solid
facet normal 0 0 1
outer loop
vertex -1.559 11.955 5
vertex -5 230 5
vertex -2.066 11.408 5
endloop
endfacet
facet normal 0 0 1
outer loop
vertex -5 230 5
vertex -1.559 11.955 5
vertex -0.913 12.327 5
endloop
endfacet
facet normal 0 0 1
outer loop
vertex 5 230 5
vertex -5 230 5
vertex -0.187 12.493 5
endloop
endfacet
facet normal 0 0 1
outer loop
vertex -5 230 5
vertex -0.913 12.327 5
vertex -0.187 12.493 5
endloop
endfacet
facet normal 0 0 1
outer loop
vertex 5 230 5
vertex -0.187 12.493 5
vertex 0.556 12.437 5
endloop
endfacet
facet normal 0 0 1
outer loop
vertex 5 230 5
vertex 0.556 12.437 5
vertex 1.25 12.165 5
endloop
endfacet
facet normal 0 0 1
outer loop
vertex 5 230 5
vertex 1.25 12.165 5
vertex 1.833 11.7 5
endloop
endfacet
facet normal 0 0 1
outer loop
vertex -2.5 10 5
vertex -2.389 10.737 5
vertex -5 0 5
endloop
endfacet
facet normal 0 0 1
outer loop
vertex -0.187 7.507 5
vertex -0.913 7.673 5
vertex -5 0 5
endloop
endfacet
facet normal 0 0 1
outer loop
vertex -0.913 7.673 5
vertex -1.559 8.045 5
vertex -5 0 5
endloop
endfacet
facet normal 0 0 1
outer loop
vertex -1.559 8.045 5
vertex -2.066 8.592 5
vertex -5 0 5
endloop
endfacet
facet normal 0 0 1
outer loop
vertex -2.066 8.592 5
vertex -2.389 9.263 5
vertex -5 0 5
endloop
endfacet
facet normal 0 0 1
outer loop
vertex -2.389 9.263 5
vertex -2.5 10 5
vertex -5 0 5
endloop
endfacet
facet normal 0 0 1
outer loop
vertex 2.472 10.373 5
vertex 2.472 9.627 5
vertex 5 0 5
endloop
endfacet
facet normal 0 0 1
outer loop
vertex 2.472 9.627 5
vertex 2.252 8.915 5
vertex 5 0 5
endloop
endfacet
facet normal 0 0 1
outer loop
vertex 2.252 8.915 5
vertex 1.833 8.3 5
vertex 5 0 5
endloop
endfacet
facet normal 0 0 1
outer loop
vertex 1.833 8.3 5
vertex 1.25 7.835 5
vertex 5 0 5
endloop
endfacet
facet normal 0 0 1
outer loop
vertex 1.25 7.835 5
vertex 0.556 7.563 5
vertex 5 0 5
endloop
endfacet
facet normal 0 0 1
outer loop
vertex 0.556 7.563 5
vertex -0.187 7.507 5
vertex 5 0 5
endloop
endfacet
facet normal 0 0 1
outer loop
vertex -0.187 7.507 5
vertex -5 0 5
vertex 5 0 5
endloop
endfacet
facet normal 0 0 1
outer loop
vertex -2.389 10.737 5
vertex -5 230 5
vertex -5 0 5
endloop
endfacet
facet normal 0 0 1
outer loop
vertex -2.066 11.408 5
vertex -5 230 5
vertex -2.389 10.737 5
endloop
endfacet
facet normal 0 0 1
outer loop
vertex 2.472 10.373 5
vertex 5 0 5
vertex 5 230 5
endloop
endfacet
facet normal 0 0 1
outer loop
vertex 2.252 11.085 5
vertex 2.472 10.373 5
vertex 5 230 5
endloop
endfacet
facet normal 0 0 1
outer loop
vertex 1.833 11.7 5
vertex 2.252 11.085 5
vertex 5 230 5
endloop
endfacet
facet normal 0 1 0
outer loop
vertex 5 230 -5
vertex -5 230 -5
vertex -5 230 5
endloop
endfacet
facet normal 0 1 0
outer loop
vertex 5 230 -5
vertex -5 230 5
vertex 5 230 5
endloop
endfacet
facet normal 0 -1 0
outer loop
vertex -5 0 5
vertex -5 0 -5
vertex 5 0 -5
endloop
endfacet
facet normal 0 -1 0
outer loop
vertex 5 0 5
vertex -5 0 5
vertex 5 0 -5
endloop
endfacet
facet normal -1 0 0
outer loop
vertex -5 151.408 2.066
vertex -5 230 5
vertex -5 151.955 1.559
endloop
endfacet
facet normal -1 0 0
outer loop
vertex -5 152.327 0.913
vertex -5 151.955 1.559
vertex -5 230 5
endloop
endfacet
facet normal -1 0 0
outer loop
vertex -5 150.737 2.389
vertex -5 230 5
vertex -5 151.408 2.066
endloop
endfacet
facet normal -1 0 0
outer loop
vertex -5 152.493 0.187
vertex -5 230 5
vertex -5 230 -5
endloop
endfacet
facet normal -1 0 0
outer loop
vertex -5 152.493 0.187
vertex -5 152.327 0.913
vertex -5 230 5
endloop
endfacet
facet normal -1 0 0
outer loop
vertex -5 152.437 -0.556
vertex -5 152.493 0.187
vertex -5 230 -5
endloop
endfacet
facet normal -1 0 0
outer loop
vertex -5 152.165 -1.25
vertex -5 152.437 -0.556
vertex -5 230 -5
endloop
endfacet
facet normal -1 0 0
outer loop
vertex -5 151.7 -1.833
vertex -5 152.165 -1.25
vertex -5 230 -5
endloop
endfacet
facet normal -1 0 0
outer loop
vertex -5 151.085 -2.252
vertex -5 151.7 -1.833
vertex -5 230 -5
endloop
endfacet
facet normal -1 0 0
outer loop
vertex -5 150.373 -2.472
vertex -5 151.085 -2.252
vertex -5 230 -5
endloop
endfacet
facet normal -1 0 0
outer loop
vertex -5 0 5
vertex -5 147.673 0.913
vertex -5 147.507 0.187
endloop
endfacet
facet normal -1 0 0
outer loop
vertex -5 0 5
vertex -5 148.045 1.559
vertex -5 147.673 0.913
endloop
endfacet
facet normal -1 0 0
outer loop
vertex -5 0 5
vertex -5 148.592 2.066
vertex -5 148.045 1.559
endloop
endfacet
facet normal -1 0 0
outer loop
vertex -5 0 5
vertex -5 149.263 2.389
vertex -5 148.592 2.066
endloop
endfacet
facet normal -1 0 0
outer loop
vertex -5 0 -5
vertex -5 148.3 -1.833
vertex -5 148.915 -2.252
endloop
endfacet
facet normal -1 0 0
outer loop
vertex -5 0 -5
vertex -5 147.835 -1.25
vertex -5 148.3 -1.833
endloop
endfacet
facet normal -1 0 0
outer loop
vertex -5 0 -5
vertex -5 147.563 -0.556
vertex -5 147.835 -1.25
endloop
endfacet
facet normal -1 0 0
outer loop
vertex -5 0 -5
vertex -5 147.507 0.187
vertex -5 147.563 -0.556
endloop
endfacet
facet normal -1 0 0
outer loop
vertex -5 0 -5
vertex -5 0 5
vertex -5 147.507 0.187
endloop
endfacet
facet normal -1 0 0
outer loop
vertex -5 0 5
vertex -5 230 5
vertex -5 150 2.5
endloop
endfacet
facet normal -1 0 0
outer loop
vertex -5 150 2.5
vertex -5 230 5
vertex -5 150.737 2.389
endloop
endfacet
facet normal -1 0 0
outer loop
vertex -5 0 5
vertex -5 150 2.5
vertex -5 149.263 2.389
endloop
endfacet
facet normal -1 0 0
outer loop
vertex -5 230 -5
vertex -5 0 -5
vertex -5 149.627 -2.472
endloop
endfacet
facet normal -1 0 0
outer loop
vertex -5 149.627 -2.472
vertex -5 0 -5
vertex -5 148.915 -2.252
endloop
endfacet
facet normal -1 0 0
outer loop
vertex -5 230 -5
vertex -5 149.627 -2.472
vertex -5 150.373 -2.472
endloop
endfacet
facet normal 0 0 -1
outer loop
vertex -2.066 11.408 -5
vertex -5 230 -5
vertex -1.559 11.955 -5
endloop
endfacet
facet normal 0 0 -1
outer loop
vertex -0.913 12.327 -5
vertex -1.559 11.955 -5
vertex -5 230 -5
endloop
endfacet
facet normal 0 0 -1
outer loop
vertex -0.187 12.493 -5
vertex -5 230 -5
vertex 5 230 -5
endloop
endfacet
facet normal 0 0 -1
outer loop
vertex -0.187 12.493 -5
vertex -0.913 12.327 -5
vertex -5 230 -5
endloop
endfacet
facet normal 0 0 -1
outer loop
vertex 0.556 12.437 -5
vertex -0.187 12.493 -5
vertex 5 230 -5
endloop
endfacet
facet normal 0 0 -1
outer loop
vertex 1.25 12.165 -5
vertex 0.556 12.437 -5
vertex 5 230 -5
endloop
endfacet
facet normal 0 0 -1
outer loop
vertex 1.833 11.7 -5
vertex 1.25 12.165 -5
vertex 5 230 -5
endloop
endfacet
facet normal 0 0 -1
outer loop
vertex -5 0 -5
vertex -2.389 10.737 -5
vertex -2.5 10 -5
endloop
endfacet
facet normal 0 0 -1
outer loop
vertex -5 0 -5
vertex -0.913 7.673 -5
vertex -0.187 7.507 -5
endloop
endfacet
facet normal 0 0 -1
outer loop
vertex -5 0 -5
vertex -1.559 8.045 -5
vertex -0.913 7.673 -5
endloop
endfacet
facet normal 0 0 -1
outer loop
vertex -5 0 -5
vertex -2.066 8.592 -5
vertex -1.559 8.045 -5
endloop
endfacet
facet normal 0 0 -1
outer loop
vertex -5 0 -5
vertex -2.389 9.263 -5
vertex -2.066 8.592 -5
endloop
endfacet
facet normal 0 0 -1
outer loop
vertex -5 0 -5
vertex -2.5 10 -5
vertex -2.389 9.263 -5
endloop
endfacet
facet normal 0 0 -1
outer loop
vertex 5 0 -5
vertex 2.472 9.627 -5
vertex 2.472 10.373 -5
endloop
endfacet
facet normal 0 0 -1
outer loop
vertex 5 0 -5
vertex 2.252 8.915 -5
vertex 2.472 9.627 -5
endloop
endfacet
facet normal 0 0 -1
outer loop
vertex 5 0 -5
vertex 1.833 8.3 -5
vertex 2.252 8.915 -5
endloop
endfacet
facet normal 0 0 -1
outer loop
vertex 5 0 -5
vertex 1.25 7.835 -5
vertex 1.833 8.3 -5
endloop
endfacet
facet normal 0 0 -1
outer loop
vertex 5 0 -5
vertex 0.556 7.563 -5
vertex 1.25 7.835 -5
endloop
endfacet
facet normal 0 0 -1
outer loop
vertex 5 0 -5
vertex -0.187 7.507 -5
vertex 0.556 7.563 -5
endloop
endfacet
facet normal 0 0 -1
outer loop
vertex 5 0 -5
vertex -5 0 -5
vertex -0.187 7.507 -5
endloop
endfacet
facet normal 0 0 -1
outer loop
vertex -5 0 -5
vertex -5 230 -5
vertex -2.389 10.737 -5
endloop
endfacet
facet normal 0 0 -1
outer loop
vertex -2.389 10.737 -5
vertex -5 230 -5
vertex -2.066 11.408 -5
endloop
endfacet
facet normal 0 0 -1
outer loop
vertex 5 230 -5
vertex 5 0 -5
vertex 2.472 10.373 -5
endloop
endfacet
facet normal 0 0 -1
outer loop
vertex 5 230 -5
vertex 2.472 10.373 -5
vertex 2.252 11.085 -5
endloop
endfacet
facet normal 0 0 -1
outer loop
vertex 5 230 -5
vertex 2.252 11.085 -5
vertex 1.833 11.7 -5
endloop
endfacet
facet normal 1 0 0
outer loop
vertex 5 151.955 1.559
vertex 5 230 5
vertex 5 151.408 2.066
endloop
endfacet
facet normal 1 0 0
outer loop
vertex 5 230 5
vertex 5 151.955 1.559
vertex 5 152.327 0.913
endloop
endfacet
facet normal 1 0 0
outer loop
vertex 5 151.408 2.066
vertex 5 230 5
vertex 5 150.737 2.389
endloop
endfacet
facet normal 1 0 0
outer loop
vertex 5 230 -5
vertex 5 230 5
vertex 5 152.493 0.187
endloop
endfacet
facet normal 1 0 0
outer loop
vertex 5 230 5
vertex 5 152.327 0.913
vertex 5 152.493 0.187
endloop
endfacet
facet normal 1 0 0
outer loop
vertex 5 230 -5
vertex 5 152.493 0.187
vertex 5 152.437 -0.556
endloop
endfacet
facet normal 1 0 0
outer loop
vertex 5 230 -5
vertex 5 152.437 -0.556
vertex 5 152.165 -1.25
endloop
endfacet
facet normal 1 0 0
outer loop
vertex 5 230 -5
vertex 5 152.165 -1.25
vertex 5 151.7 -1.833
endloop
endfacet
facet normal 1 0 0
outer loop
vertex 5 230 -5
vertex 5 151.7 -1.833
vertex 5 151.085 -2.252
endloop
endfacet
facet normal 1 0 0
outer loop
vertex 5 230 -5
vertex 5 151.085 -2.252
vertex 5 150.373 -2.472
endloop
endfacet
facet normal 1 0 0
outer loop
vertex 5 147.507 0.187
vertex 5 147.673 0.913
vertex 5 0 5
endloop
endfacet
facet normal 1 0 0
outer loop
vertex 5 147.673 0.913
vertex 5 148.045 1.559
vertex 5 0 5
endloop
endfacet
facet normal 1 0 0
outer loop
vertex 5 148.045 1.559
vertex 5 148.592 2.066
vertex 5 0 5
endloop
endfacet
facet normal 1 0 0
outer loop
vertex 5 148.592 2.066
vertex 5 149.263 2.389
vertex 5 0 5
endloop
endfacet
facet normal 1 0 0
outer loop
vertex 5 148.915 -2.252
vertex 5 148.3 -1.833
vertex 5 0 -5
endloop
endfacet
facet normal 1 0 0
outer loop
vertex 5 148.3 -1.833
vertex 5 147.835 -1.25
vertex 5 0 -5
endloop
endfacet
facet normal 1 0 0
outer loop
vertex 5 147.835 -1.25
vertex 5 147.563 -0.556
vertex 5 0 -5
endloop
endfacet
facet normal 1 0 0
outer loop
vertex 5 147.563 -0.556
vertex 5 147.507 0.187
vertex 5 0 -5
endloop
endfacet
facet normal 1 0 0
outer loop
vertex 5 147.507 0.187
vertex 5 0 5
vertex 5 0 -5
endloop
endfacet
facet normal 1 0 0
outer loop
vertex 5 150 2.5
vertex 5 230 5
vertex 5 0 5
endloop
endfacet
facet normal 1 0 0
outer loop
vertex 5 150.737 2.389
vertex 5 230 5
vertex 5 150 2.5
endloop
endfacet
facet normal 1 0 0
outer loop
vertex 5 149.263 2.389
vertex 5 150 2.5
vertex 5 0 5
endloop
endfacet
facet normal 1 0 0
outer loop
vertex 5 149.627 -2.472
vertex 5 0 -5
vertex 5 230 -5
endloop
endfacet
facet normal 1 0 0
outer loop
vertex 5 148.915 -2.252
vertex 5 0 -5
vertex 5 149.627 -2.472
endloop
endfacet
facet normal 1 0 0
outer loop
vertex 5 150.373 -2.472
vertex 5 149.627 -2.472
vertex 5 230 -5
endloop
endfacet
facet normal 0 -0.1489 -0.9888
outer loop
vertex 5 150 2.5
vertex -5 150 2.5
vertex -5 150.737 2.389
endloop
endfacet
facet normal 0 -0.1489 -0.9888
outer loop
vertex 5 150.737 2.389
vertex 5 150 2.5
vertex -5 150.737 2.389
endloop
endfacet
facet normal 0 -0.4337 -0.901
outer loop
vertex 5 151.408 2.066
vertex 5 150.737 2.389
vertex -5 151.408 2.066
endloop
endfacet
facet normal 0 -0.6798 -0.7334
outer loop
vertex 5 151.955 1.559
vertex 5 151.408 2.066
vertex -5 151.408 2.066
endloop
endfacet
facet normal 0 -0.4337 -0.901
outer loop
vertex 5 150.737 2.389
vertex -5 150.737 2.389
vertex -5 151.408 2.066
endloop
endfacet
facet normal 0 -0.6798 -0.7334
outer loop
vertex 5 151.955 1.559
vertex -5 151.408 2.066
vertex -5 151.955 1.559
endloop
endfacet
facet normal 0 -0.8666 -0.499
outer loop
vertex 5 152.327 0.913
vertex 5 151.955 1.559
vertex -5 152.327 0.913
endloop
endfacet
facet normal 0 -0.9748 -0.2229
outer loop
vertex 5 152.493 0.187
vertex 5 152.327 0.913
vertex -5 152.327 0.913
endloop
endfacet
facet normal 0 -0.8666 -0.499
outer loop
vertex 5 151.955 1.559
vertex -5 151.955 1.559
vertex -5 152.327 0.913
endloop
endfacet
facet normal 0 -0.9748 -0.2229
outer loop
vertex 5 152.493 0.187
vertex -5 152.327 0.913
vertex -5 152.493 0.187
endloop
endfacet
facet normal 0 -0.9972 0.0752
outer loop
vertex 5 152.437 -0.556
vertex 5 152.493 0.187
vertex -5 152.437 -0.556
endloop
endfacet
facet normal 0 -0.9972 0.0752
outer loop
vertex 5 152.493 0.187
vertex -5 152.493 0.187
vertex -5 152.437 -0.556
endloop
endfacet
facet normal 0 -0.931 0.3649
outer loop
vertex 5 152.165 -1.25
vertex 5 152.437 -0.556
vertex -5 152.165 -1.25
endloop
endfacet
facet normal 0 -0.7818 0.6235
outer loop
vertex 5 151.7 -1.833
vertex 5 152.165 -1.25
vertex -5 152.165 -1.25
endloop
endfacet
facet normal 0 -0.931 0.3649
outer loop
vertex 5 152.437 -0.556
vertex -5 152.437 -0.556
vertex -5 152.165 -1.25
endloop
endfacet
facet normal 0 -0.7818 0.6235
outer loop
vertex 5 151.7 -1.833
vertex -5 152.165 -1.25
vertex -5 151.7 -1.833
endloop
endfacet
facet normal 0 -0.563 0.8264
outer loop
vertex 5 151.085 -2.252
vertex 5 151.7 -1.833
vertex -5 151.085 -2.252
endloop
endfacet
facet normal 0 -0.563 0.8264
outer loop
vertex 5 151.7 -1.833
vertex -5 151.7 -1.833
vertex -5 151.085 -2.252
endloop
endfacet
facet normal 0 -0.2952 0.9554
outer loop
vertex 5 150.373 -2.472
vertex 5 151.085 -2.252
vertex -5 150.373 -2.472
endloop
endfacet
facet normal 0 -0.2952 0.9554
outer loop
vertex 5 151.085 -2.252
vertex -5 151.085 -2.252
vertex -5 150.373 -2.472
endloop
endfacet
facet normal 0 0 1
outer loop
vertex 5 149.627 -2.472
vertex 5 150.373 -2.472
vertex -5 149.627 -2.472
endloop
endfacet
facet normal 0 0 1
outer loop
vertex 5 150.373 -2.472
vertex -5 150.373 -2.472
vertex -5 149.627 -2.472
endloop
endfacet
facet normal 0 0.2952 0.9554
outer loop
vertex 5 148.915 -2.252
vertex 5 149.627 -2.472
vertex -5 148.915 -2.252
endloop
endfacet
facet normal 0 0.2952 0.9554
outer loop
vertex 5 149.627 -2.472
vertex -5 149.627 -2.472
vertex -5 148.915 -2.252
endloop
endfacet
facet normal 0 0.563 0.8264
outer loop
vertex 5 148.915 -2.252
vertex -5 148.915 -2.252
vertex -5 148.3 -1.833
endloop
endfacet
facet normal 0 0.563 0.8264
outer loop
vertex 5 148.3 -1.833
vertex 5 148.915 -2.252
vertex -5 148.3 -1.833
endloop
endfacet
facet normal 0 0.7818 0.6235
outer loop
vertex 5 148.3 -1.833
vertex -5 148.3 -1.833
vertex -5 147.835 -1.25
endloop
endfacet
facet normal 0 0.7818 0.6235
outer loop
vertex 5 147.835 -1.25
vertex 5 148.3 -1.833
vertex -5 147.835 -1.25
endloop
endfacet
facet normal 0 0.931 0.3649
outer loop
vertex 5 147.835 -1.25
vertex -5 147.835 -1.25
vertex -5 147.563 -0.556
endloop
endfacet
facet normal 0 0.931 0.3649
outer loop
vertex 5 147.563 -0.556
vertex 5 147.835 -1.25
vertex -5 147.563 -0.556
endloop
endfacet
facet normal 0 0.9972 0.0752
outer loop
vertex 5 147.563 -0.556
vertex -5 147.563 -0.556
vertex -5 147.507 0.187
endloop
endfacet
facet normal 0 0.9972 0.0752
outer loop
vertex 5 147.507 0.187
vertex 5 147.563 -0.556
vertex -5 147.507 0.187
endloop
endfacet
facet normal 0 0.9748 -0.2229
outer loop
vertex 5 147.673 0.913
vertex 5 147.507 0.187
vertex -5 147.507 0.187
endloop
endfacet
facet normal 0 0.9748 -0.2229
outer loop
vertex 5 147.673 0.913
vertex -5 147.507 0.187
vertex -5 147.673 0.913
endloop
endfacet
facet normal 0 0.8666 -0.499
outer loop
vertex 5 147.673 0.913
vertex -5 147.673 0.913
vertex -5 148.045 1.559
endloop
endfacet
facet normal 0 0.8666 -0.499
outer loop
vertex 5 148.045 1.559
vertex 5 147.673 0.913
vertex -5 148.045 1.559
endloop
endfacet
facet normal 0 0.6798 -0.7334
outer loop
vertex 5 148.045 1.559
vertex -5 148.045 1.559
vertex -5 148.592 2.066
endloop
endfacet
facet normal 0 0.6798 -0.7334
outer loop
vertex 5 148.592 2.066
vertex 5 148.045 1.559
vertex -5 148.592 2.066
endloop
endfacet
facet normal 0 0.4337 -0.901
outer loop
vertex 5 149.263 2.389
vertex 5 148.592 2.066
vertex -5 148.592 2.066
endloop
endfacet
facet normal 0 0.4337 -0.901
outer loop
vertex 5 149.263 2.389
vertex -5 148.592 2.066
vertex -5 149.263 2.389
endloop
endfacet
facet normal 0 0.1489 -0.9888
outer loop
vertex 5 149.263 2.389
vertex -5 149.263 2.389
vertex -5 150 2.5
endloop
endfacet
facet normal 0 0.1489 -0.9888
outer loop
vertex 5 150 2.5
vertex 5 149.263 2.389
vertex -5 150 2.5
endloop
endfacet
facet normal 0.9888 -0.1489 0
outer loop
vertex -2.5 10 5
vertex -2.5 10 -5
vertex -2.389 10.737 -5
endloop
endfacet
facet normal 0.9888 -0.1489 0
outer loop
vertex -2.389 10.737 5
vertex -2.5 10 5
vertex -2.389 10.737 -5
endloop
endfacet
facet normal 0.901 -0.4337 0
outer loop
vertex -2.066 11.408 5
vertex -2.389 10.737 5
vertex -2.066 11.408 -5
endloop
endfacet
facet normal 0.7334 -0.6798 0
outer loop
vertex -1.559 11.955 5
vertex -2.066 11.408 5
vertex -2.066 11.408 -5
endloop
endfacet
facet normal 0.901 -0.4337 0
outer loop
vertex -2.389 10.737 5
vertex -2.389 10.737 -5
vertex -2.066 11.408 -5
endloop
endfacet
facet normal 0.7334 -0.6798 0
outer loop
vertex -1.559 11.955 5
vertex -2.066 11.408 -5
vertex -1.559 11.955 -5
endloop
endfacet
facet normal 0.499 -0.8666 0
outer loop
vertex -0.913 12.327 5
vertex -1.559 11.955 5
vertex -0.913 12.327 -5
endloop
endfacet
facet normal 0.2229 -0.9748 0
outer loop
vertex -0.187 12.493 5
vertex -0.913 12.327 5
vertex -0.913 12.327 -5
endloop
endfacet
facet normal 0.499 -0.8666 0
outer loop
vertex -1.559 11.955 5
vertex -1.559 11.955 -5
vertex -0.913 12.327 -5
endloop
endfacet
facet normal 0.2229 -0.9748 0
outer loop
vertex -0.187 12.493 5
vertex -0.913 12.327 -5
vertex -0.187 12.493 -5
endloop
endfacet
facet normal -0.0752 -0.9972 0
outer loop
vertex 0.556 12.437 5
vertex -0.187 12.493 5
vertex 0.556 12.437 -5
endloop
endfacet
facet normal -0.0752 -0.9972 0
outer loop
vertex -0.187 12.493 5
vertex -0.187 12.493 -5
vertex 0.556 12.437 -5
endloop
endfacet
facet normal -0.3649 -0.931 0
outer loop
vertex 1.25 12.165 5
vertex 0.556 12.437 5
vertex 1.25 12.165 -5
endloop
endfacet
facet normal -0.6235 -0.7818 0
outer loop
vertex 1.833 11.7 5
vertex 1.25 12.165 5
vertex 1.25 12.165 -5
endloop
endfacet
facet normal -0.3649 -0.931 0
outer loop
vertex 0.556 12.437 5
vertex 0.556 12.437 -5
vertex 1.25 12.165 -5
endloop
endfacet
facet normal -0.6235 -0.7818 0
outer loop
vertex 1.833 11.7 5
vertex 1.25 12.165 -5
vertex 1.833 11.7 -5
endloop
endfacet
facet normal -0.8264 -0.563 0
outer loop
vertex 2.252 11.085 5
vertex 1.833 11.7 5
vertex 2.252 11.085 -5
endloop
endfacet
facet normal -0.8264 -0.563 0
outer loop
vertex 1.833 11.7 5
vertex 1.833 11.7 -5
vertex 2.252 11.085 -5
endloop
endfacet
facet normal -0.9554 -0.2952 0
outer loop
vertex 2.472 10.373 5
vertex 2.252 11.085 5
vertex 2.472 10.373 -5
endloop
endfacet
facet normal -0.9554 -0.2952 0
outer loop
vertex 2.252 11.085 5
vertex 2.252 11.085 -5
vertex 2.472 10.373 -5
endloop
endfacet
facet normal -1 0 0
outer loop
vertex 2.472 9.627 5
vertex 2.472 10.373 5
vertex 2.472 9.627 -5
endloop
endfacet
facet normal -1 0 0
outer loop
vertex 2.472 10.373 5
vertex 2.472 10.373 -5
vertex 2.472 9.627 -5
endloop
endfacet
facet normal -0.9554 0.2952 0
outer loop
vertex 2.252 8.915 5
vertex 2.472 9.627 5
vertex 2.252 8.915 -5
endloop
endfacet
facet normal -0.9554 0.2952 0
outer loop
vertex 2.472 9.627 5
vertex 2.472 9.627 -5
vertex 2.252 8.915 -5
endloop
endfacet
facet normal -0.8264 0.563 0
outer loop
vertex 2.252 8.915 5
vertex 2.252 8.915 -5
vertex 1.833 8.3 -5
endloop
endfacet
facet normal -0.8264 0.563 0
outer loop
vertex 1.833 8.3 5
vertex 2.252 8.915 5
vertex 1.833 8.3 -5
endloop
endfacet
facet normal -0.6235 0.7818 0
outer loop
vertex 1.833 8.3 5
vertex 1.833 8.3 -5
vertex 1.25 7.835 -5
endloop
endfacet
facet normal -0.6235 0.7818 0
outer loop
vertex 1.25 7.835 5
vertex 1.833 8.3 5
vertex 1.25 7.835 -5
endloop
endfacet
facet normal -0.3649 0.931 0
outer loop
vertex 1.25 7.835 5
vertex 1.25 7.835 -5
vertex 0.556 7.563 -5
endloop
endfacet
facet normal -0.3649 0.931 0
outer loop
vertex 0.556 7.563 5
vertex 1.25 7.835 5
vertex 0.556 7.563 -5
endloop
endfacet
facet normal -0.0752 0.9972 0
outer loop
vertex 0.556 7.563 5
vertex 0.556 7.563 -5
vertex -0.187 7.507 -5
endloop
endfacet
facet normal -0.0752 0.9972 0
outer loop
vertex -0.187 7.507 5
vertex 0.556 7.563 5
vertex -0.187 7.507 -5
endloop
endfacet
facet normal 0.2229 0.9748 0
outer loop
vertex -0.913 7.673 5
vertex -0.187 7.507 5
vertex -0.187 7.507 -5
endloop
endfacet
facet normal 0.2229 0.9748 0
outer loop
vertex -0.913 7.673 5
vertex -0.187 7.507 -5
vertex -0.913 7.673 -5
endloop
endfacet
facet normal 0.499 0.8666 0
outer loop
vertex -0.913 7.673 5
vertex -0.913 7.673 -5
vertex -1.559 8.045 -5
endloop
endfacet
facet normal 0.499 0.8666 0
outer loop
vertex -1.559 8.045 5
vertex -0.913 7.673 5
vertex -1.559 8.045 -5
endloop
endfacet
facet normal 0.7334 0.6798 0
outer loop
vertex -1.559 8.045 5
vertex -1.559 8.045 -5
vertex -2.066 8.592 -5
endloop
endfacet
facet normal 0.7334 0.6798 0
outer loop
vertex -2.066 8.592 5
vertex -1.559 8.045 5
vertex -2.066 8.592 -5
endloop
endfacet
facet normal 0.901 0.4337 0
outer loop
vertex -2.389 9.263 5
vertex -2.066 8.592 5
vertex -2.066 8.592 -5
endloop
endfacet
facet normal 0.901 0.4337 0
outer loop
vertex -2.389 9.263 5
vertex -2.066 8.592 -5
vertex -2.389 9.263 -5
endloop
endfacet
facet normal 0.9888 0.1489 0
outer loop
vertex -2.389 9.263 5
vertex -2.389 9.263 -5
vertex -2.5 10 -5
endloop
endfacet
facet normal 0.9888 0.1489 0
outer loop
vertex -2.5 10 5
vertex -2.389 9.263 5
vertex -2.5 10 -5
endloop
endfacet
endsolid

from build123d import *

# Parameters (mm, degrees)
SKETCH1_W           = 10
SKETCH1_H           = 10
BOSS_EXTRUDE1_DEPTH = 300
SKETCH3_R           = 2.5
CUT_EXTRUDE1_DEPTH  = 301.208261046
SKETCH4_W           = 10
SKETCH4_H           = 10
CUT_EXTRUDE2_DEPTH  = 70
SKETCH5_R           = 2.5
CUT_EXTRUDE3_DEPTH  = 231.271578793


with BuildPart() as part:
    # Sketch1 → Boss-Extrude1 (new body)
    with BuildSketch(Plane(origin=(0, 0, 0), x_dir=(1, 0, 0), z_dir=(0, 1, 0))):
        Rectangle(SKETCH1_W, SKETCH1_H)
    extrude(amount=BOSS_EXTRUDE1_DEPTH)

    # Sketch3 → Cut-Extrude1 (cut, through all)
    with BuildSketch(Plane.ZY.offset(5)):
        with Locations((0, 150)):
            Circle(SKETCH3_R)
    extrude(amount=-CUT_EXTRUDE1_DEPTH, mode=Mode.SUBTRACT)

    # Sketch4 → Cut-Extrude2 (cut)
    with BuildSketch(Plane(origin=(0, 300, 0), x_dir=(1, 0, 0), z_dir=(0, 1, 0))):
        Rectangle(SKETCH4_W, SKETCH4_H)
    extrude(amount=-CUT_EXTRUDE2_DEPTH, mode=Mode.SUBTRACT)

    # Sketch5 → Cut-Extrude3 (cut, through all)
    with BuildSketch(Plane(origin=(0, 0, -5), x_dir=(-1, 0, 0), z_dir=(0, 0, -1))):
        with Locations((0, 10)):
            Circle(SKETCH5_R)
    extrude(amount=-CUT_EXTRUDE3_DEPTH, mode=Mode.SUBTRACT)


solid = part.part
